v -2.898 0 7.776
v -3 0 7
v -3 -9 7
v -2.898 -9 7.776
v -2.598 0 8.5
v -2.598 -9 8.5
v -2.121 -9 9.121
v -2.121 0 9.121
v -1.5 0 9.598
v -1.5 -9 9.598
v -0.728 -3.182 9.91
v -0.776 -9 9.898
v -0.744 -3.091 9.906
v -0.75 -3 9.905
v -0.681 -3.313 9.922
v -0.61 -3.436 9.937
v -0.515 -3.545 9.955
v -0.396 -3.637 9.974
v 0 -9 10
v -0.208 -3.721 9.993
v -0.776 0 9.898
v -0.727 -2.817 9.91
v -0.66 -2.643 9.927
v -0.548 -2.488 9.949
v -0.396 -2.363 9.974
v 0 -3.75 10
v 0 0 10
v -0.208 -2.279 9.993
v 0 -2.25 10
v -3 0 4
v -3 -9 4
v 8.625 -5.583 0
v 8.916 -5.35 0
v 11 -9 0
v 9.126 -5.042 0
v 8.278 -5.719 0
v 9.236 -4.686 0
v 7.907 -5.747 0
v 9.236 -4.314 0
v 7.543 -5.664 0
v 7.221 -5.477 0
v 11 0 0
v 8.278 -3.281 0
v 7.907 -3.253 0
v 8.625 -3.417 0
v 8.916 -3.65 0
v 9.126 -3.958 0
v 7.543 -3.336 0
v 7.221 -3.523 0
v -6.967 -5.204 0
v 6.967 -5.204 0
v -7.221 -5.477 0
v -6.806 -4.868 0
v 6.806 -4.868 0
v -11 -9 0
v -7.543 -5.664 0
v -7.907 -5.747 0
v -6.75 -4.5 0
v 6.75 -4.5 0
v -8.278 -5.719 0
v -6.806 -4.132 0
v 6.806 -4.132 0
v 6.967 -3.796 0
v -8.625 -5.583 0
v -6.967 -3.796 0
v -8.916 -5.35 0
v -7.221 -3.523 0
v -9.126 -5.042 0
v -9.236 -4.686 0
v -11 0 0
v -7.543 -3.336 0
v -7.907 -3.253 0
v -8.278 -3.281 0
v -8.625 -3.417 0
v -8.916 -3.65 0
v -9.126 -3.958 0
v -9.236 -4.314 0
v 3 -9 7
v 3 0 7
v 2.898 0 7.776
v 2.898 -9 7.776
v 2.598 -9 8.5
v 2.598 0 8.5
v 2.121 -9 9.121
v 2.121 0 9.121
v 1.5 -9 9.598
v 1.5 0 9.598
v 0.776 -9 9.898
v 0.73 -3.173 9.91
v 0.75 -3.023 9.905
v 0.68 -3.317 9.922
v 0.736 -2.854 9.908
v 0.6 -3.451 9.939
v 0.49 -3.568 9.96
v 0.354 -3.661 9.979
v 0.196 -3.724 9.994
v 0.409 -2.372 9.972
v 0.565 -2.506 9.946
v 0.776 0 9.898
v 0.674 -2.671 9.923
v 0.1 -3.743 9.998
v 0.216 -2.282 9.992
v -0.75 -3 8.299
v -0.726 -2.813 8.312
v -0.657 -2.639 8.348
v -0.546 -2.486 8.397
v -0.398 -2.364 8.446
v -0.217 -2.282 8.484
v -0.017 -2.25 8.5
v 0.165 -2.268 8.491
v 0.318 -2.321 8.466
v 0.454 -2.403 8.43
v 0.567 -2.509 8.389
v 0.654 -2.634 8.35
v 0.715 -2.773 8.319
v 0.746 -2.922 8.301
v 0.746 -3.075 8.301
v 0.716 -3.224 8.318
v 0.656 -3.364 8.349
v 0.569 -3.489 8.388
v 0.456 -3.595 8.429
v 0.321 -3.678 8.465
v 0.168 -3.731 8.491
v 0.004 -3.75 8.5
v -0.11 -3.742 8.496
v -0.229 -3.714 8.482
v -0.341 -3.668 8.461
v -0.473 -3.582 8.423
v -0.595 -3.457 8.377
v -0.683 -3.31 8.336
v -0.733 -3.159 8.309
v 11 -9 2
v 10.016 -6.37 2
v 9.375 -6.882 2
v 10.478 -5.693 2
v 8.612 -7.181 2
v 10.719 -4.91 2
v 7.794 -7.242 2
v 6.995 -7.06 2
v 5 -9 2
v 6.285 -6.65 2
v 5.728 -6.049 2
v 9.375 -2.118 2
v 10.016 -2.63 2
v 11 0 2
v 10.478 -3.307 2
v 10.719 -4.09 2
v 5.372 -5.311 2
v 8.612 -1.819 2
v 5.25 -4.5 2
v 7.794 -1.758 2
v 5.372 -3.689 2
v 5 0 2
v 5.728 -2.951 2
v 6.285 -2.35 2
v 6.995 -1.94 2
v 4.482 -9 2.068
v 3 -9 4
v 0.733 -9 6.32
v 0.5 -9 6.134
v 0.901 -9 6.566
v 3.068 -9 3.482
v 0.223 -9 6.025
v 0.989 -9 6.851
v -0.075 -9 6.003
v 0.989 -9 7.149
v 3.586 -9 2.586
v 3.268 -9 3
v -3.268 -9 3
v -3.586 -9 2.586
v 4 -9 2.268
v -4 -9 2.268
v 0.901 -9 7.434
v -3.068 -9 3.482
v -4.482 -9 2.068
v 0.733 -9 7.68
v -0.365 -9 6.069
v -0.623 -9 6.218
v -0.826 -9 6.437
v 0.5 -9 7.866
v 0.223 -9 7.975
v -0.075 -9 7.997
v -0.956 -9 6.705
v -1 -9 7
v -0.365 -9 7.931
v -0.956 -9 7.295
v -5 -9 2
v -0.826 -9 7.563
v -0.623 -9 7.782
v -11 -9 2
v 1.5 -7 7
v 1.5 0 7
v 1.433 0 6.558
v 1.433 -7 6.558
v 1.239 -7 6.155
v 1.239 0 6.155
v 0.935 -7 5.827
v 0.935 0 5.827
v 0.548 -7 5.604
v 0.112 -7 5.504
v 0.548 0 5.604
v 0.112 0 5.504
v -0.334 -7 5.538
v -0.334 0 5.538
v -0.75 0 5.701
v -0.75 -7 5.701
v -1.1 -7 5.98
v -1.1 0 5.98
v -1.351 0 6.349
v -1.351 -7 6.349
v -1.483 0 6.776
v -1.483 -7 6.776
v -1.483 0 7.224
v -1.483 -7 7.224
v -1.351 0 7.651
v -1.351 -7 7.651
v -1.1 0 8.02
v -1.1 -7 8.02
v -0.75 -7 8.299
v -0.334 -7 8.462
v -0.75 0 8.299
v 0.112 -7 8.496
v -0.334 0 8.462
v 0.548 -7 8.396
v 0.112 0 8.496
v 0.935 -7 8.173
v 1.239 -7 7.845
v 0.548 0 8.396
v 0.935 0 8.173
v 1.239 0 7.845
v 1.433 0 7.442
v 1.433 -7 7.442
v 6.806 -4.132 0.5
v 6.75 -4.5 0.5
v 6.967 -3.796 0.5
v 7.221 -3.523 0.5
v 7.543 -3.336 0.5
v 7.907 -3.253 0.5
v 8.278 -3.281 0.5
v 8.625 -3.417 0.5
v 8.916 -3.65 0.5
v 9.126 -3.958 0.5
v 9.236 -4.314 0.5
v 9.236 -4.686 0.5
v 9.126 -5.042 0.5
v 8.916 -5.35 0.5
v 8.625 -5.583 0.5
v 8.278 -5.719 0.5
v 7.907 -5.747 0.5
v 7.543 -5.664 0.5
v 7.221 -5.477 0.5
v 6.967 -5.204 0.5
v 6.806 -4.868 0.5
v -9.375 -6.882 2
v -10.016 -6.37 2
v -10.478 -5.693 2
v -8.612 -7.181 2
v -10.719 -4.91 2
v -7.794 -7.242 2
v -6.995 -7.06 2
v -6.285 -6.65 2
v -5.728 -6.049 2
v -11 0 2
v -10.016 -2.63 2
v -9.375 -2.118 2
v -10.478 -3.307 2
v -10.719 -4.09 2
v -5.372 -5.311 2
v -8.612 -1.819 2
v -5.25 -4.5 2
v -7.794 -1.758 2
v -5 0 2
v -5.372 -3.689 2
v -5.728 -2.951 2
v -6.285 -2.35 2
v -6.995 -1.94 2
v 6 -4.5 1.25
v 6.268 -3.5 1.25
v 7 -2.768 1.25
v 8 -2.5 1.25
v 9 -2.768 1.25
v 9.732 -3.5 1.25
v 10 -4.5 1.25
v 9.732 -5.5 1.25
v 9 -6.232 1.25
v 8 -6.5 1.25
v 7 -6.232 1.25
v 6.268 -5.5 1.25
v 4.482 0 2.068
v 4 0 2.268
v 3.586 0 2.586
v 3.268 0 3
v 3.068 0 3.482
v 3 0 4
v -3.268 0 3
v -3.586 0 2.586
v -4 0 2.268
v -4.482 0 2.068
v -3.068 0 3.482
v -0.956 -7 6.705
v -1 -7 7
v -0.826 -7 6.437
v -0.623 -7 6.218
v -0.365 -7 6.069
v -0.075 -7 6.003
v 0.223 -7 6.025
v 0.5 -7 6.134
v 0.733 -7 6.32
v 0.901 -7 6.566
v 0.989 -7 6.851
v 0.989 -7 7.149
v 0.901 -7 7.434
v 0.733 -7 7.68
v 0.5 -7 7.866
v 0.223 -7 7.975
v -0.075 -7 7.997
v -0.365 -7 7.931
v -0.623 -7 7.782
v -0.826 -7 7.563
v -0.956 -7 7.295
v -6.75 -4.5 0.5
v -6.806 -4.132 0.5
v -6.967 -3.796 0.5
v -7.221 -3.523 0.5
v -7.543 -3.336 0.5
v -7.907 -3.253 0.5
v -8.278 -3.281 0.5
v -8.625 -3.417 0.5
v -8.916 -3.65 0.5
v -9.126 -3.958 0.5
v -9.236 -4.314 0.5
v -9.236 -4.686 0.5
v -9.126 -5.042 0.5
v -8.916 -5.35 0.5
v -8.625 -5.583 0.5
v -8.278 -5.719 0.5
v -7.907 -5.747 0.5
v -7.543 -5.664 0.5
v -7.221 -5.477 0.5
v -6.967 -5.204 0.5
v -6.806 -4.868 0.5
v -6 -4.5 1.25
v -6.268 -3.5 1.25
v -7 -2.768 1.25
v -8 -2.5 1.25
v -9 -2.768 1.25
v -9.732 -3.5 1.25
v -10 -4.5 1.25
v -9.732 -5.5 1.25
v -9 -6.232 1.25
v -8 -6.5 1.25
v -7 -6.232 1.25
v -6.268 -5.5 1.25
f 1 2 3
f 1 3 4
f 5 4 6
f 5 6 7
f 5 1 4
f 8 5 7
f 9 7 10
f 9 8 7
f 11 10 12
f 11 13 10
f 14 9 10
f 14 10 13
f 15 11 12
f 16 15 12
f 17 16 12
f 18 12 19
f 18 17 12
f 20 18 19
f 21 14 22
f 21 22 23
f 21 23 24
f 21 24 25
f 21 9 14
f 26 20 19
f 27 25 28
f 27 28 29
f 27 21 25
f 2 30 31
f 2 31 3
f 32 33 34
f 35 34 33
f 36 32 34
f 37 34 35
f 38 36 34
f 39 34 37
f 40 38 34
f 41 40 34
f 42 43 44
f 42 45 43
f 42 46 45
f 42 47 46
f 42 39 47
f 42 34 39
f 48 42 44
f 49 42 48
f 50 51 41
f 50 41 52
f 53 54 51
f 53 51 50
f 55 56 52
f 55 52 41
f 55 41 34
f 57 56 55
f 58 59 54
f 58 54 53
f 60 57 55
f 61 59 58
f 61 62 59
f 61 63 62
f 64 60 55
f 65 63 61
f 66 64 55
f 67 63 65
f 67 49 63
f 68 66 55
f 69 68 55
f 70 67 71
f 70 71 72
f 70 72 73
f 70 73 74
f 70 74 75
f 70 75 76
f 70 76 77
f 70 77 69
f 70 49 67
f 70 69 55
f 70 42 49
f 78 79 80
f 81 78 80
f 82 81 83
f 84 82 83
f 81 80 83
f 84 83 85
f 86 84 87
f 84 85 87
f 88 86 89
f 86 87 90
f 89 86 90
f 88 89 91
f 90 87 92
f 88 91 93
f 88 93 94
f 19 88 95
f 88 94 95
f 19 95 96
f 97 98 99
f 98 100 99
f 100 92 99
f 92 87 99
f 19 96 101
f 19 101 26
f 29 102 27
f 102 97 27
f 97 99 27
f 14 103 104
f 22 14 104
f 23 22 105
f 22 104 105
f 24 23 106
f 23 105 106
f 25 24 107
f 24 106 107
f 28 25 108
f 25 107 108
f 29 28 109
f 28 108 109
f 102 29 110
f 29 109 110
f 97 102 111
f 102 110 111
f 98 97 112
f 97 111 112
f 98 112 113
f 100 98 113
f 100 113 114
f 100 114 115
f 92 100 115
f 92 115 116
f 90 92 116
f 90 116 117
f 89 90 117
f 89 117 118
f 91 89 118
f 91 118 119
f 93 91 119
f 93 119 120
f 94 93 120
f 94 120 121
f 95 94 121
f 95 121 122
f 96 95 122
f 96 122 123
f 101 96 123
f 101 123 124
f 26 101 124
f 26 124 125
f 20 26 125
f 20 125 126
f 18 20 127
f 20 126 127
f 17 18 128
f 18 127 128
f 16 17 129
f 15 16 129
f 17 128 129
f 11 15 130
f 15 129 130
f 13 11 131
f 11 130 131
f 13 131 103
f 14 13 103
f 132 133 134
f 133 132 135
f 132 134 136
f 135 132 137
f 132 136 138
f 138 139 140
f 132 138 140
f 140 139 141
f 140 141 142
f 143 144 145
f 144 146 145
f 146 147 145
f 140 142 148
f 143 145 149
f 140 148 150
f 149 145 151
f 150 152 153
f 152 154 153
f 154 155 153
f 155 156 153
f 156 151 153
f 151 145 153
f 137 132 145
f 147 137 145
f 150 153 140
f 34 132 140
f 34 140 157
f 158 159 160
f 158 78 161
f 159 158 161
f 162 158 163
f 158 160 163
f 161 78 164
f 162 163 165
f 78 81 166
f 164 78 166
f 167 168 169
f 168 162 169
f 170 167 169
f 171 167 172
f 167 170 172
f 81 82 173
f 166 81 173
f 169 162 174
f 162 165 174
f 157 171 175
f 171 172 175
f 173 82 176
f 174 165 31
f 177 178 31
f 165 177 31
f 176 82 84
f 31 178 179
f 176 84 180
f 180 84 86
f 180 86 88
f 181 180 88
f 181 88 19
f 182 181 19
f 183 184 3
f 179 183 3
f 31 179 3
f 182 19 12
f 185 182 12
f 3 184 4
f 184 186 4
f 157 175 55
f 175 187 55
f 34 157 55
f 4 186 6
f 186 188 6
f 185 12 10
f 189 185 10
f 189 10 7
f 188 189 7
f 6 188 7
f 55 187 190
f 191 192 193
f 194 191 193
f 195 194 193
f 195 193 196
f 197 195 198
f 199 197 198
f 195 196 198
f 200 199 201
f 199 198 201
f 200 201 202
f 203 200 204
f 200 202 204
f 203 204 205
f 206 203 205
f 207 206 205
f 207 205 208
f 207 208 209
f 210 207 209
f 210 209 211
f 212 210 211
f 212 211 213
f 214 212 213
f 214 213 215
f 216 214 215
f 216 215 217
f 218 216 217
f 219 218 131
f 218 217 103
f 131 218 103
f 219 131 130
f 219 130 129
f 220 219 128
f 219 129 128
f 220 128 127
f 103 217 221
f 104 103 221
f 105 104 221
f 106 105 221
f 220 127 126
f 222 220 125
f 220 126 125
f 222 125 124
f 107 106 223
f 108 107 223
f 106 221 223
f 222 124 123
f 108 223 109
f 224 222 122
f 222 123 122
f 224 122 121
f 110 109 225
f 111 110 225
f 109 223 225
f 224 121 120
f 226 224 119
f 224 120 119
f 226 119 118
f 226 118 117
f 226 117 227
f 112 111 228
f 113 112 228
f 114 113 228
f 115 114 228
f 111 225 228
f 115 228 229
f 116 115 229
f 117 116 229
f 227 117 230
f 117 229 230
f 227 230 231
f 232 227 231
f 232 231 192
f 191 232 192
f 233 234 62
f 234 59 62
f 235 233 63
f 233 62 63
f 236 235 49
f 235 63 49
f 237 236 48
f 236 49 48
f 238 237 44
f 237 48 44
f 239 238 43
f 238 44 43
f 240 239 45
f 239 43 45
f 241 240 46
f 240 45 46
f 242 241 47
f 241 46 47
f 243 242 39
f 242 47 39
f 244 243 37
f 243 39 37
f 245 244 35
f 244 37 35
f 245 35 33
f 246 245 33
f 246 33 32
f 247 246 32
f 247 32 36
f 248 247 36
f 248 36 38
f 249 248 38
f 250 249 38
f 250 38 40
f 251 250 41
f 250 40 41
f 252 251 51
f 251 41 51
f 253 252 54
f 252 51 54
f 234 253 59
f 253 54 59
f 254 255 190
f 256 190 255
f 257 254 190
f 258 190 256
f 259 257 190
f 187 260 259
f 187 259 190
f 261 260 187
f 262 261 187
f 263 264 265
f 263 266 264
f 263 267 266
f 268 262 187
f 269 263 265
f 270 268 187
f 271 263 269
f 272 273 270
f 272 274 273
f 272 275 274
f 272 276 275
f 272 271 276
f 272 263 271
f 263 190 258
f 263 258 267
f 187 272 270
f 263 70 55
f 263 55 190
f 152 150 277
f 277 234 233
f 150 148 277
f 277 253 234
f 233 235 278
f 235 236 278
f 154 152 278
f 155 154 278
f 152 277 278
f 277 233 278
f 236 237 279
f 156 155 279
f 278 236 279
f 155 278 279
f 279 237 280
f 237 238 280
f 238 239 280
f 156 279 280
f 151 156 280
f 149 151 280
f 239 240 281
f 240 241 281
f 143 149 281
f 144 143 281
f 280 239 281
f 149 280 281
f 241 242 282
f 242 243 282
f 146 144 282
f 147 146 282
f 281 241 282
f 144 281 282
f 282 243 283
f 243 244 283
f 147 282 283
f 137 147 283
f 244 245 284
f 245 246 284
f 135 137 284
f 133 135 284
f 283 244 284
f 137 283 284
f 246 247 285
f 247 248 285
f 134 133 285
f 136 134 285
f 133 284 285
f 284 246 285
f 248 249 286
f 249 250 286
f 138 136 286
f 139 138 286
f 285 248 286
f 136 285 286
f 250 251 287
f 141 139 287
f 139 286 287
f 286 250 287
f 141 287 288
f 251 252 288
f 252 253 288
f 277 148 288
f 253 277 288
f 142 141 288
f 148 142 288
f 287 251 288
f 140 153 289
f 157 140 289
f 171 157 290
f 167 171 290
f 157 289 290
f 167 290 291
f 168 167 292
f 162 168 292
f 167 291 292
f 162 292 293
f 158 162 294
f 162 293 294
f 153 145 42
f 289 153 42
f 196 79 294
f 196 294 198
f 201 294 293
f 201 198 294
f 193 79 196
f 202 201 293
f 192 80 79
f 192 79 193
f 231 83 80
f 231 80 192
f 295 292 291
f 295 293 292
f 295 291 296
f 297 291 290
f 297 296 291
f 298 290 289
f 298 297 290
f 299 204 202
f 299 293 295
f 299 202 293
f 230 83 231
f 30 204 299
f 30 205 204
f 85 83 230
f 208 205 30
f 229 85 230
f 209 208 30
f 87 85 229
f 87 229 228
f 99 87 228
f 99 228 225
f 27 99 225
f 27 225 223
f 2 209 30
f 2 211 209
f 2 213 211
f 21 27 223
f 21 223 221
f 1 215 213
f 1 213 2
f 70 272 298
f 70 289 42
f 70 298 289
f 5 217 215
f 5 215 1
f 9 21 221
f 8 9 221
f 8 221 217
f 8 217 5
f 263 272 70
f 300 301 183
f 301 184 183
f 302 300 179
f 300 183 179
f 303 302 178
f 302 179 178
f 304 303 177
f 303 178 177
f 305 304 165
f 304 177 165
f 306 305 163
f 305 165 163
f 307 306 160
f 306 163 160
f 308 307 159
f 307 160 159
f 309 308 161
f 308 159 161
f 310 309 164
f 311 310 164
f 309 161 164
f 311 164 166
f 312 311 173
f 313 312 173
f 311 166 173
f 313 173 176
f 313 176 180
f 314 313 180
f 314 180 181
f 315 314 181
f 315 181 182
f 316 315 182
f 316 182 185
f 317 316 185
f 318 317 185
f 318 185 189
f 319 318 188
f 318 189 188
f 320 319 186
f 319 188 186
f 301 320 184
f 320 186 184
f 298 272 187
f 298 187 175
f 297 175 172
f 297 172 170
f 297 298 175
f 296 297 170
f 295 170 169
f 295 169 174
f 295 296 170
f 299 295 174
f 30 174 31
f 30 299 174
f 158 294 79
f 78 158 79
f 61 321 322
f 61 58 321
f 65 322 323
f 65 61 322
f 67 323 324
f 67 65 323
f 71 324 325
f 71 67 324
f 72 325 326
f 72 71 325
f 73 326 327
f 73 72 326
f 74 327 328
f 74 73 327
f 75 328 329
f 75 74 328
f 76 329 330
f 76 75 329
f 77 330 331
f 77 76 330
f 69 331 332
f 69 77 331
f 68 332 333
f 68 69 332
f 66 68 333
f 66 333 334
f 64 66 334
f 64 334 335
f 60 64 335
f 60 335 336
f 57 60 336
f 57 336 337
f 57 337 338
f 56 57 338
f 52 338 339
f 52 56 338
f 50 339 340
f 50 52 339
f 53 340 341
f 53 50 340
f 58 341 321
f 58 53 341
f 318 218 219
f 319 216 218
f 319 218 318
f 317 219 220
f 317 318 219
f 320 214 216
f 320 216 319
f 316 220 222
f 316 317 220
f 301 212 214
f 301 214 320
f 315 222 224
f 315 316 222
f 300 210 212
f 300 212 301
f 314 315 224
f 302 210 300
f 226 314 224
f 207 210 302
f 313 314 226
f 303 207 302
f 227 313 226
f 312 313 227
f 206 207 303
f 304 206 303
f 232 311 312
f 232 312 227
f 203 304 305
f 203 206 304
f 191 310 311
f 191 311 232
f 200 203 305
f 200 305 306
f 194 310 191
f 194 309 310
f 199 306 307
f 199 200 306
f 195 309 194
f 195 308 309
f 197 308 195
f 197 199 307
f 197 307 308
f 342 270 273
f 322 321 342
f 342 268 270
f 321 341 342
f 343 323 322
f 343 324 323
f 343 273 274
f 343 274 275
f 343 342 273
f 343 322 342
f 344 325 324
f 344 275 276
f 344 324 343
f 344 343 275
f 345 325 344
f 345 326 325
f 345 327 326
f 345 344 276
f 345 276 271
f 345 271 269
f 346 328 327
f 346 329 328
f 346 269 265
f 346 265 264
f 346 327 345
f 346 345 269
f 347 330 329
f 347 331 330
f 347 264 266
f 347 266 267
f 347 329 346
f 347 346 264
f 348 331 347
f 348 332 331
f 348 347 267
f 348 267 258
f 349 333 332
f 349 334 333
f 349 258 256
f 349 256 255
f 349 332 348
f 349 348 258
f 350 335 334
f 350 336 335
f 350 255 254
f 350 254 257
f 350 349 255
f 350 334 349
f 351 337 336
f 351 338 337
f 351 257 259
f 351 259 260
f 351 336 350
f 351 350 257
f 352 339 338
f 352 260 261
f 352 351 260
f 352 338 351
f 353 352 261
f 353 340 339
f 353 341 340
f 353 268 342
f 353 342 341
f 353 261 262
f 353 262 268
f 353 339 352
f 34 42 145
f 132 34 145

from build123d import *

# Parameters (mm, degrees)
F1_DEPTH       = 9
F3_D           = 2.5
F3_CSINK_D     = 5.5
F3_CSINK_ANGLE = 90
F5_D           = 2
F5_CBORE_D     = 3
F5_CBORE_DEPTH = 7
F8_D           = 1.5
F8_DEPTH       = 3
F8_START       = 0.0952626
F8_TIP         = 0.4506454643


with BuildPart() as f1:
    # F0 (on Front) → F1 (new body)
    with BuildSketch(Plane.XZ):
        with BuildLine():
            Line((0, 10), (0, 0))
            Line((0, 0), (11, 0))
            Line((11, 0), (11, 2))
            Line((11, 2), (5, 2))
            ThreePointArc((5, 2), (3.5857864376, 2.5857864376), (3, 4))
            Line((3, 4), (3, 7))
            ThreePointArc((3, 7), (2.1213203436, 9.1213203436), (0, 10))
        make_face()
    extrude(amount=F1_DEPTH)

    # F3 (through all)
    with Locations(Plane.XY.offset(2)):
        with Locations((8, -4.5)):
            CounterSinkHole(F3_D / 2, F3_CSINK_D / 2, counter_sink_angle=F3_CSINK_ANGLE)

    # F4: F1 across plane


with BuildPart() as f1_1:
    add(f1.part)
    add(f1.part.mirror(Plane.YZ))

    # F5 (through all)
    with Locations(Plane(origin=(0, 0, 0), x_dir=(1, 0, 0), z_dir=(0, 1, 0))):
        with Locations((0, -7)):
            CounterBoreHole(F5_D / 2, F5_CBORE_D / 2, F5_CBORE_DEPTH)

    # F8
    # its depths count from where the whole tool has entered the part; down to there all is cleared
    with Locations(Plane.XY.offset(10).offset(-F8_START)):
        with Locations((0, -3)):
            Hole(F8_D / 2, depth=F8_DEPTH)
            with Locations((0, 0, -(F8_DEPTH + F8_TIP / 2))):  # 118° drill point
                Cone(0, F8_D / 2, F8_TIP, mode=Mode.SUBTRACT)


solid = f1_1.part
